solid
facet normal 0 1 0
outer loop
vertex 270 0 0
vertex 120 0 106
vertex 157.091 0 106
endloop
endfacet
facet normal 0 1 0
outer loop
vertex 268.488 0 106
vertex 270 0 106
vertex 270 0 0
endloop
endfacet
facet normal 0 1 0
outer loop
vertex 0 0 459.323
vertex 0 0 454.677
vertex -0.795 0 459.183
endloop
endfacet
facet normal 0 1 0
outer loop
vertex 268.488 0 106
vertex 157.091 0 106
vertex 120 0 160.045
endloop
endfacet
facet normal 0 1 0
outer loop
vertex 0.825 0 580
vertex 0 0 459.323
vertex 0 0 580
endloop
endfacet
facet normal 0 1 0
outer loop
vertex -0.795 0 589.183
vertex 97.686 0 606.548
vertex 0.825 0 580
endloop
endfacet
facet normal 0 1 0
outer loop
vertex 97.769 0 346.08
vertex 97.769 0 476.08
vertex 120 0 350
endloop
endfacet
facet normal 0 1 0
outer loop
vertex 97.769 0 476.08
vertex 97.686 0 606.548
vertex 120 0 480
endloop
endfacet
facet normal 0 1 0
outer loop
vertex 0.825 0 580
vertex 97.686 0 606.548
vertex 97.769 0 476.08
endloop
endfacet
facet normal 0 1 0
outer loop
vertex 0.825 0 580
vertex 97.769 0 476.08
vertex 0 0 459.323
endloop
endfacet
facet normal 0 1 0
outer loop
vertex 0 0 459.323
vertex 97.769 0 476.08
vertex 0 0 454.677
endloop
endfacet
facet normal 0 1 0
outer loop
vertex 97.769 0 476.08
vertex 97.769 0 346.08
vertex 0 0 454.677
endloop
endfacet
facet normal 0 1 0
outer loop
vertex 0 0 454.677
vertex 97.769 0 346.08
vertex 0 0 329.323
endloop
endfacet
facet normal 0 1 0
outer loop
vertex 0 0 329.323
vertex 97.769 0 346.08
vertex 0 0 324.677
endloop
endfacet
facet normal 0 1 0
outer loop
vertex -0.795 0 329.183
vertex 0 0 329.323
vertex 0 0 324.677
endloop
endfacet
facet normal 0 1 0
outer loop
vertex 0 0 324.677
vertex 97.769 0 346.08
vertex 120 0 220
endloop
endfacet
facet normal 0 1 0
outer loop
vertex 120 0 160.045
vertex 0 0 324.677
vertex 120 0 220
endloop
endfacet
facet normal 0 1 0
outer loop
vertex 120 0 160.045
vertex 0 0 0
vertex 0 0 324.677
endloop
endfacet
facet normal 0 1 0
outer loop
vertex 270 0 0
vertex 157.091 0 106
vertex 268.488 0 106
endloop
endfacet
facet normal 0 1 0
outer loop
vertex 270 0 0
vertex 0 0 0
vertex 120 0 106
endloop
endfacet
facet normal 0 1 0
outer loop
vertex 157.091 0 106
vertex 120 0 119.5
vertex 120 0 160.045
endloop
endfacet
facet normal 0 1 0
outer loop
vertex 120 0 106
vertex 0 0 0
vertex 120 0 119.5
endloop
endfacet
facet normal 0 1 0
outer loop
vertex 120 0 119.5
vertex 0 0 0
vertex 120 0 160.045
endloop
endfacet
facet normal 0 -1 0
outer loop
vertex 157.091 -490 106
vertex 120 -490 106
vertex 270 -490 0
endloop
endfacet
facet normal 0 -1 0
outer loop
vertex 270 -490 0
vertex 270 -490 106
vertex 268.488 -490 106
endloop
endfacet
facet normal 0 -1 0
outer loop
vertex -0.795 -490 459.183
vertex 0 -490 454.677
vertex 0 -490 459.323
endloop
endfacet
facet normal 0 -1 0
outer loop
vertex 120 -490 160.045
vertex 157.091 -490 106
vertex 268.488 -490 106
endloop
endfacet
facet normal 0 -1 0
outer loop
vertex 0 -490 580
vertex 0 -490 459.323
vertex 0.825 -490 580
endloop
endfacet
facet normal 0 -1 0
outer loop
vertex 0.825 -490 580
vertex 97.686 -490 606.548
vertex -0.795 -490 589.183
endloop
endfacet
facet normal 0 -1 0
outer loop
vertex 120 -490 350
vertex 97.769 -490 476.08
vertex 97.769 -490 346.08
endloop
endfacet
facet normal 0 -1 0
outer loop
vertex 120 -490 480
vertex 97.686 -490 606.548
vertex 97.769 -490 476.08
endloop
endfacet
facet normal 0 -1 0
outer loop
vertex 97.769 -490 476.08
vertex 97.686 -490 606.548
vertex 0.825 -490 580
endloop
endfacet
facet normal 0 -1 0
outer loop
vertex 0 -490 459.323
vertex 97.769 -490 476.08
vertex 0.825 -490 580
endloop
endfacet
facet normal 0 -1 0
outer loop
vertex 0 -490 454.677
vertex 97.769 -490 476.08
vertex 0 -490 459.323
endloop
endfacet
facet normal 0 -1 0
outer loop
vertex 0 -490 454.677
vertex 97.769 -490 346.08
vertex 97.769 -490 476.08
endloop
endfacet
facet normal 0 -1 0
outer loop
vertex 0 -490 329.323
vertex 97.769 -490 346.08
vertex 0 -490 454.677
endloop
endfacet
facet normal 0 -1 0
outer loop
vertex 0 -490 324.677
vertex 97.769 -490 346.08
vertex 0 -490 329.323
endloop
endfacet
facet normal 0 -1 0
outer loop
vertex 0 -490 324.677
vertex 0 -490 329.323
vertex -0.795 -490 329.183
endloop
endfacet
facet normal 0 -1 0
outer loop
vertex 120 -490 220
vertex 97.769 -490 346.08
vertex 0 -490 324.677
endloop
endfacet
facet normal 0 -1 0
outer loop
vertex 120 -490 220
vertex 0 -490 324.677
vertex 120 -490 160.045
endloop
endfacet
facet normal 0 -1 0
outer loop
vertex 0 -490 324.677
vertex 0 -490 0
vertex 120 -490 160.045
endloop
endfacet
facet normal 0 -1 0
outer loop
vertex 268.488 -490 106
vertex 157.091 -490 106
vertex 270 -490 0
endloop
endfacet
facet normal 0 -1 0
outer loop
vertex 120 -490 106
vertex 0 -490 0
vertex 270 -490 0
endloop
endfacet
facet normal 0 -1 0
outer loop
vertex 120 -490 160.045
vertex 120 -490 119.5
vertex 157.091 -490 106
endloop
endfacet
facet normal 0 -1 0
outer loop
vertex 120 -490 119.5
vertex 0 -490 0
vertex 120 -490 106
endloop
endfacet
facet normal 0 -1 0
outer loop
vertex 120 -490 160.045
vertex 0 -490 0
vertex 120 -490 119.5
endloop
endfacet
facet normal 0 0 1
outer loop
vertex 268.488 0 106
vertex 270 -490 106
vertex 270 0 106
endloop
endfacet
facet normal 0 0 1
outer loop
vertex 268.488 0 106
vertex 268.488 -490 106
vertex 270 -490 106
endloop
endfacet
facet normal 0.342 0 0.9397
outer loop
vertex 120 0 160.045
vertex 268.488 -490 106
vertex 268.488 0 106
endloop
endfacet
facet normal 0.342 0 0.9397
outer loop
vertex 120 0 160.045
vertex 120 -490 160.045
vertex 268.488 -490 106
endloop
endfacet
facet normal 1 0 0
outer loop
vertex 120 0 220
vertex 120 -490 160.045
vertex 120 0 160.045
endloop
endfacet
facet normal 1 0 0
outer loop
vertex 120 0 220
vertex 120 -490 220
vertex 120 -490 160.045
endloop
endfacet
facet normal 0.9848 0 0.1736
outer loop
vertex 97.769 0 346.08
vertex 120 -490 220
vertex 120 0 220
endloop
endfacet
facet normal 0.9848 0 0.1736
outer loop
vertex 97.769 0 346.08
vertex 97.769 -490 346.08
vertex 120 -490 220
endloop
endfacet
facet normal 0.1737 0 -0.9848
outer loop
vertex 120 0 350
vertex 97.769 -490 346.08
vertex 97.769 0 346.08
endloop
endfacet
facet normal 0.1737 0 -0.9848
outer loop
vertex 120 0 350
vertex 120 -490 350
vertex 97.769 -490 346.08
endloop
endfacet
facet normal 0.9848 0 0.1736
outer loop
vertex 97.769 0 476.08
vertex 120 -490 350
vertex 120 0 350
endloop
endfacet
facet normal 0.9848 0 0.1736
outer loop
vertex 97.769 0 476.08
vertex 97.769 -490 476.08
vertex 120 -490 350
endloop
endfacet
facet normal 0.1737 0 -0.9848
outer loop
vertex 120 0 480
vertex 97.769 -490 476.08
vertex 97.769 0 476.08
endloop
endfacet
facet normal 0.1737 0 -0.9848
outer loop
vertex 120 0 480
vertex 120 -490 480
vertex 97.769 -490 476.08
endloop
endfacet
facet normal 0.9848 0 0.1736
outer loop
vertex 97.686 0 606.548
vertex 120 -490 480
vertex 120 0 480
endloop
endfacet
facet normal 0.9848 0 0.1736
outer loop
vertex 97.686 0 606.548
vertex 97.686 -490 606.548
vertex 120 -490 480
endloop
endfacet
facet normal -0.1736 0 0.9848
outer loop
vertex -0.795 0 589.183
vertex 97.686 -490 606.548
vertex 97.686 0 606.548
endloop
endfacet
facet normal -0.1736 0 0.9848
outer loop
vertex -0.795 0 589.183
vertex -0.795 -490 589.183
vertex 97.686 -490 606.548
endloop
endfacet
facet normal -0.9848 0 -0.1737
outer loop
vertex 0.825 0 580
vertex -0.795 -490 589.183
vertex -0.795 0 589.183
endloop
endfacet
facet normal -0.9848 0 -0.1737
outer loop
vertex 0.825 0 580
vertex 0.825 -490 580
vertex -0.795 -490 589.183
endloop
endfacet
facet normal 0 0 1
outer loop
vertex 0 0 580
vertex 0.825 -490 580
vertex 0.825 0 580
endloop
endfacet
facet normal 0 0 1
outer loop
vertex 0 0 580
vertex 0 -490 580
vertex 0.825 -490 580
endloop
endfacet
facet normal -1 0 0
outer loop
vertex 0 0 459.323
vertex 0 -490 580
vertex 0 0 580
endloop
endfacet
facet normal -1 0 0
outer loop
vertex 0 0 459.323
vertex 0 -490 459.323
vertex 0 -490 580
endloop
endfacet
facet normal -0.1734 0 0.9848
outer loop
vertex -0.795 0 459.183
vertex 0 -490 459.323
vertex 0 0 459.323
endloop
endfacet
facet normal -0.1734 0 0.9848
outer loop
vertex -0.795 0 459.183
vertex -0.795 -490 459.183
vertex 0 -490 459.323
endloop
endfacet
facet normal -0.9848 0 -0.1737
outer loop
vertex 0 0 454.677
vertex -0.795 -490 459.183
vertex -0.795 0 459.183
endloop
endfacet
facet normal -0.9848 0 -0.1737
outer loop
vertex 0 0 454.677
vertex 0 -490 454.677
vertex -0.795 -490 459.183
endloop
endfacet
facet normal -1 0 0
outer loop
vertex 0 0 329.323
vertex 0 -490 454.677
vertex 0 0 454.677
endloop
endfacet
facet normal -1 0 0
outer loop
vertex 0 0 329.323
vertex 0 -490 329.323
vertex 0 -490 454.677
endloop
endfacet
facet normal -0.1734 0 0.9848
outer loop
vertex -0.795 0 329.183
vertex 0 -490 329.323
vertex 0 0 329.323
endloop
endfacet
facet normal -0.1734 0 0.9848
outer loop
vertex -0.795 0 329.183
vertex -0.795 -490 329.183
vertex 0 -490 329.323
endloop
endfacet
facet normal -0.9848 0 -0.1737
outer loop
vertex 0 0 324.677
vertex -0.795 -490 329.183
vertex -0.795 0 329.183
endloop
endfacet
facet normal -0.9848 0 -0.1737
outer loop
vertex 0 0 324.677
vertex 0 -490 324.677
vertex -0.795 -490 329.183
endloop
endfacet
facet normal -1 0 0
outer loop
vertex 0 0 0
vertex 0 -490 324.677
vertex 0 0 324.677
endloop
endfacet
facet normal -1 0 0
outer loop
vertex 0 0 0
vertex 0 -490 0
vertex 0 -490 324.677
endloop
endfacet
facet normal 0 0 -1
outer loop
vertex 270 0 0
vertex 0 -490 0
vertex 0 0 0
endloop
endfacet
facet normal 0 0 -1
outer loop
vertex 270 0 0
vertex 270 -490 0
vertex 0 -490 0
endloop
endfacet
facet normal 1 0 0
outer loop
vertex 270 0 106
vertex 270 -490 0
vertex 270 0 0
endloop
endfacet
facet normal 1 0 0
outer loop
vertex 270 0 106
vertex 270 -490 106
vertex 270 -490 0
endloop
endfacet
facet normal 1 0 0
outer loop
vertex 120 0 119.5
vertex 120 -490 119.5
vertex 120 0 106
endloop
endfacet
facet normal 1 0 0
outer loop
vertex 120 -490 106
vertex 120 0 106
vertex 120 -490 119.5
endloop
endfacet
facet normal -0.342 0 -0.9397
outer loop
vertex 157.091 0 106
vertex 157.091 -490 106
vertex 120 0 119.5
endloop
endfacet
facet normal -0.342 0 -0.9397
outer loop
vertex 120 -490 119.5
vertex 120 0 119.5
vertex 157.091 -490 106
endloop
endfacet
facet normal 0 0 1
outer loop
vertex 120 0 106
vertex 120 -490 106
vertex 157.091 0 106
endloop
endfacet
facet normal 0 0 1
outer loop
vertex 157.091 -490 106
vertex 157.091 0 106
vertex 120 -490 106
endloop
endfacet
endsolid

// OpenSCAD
//holzschnitt:
// h = hoehe
// b = breite
// t = tiefe
// hs = holzstaerke

// 2x hxb
// kb_h + hs x b+2*hs (frontblende keyboard)
// t x b (keyboard auflage)
// kb_h x b + 2*hs (blende ueberhalb kb)
// 2x (50 x b) rackmounts fuer pedalboardplatte
// 100 x b + 2*hs (dach)
// 50 x b (streben rueckseite)

// pedalboardplatte und eurorack covers

// 2 x (module_h x b + 2*hs)


//keyboard angle
kb_a = 20;

//keyboard dimensions
kb_l = 490;
kb_h = 38.1;
kb_w = 160;

//bottom height
b_h = 70;

module_h = 128.5;
module_d = 100;

//height module 1
hm1 = 150;

//modules angle
m_a = 80;

//distance between modules
dbm = 130;


// width upper
wu = 120;

wb = 270;


rotate([90,0,0]) linear_extrude(kb_l) 

translate([wu,0,0])
union() {

    color("blue")
    translate([-wu,0,0]) {
        
        square([94,580]);
        square([wu,220]);
        square([wb,106]);

    }

    translate([-wu+wb-14,b_h,0])rotate([0,0,-kb_a])translate([-kb_w,0,0])square([kb_w,kb_h]);


    translate([0,b_h+hm1,0])rotate([0,0,-m_a])translate([-module_h,-module_d,0])square([module_h,module_d]);
    translate([0,b_h+hm1+dbm,0])rotate([0,0,-m_a])translate([-module_h,-module_d,0])square([module_h,module_d]);
    translate([0,b_h+hm1+2*dbm,0])rotate([0,0,-m_a])translate([-module_h,-module_d,0])square([module_h,module_d]);

}
